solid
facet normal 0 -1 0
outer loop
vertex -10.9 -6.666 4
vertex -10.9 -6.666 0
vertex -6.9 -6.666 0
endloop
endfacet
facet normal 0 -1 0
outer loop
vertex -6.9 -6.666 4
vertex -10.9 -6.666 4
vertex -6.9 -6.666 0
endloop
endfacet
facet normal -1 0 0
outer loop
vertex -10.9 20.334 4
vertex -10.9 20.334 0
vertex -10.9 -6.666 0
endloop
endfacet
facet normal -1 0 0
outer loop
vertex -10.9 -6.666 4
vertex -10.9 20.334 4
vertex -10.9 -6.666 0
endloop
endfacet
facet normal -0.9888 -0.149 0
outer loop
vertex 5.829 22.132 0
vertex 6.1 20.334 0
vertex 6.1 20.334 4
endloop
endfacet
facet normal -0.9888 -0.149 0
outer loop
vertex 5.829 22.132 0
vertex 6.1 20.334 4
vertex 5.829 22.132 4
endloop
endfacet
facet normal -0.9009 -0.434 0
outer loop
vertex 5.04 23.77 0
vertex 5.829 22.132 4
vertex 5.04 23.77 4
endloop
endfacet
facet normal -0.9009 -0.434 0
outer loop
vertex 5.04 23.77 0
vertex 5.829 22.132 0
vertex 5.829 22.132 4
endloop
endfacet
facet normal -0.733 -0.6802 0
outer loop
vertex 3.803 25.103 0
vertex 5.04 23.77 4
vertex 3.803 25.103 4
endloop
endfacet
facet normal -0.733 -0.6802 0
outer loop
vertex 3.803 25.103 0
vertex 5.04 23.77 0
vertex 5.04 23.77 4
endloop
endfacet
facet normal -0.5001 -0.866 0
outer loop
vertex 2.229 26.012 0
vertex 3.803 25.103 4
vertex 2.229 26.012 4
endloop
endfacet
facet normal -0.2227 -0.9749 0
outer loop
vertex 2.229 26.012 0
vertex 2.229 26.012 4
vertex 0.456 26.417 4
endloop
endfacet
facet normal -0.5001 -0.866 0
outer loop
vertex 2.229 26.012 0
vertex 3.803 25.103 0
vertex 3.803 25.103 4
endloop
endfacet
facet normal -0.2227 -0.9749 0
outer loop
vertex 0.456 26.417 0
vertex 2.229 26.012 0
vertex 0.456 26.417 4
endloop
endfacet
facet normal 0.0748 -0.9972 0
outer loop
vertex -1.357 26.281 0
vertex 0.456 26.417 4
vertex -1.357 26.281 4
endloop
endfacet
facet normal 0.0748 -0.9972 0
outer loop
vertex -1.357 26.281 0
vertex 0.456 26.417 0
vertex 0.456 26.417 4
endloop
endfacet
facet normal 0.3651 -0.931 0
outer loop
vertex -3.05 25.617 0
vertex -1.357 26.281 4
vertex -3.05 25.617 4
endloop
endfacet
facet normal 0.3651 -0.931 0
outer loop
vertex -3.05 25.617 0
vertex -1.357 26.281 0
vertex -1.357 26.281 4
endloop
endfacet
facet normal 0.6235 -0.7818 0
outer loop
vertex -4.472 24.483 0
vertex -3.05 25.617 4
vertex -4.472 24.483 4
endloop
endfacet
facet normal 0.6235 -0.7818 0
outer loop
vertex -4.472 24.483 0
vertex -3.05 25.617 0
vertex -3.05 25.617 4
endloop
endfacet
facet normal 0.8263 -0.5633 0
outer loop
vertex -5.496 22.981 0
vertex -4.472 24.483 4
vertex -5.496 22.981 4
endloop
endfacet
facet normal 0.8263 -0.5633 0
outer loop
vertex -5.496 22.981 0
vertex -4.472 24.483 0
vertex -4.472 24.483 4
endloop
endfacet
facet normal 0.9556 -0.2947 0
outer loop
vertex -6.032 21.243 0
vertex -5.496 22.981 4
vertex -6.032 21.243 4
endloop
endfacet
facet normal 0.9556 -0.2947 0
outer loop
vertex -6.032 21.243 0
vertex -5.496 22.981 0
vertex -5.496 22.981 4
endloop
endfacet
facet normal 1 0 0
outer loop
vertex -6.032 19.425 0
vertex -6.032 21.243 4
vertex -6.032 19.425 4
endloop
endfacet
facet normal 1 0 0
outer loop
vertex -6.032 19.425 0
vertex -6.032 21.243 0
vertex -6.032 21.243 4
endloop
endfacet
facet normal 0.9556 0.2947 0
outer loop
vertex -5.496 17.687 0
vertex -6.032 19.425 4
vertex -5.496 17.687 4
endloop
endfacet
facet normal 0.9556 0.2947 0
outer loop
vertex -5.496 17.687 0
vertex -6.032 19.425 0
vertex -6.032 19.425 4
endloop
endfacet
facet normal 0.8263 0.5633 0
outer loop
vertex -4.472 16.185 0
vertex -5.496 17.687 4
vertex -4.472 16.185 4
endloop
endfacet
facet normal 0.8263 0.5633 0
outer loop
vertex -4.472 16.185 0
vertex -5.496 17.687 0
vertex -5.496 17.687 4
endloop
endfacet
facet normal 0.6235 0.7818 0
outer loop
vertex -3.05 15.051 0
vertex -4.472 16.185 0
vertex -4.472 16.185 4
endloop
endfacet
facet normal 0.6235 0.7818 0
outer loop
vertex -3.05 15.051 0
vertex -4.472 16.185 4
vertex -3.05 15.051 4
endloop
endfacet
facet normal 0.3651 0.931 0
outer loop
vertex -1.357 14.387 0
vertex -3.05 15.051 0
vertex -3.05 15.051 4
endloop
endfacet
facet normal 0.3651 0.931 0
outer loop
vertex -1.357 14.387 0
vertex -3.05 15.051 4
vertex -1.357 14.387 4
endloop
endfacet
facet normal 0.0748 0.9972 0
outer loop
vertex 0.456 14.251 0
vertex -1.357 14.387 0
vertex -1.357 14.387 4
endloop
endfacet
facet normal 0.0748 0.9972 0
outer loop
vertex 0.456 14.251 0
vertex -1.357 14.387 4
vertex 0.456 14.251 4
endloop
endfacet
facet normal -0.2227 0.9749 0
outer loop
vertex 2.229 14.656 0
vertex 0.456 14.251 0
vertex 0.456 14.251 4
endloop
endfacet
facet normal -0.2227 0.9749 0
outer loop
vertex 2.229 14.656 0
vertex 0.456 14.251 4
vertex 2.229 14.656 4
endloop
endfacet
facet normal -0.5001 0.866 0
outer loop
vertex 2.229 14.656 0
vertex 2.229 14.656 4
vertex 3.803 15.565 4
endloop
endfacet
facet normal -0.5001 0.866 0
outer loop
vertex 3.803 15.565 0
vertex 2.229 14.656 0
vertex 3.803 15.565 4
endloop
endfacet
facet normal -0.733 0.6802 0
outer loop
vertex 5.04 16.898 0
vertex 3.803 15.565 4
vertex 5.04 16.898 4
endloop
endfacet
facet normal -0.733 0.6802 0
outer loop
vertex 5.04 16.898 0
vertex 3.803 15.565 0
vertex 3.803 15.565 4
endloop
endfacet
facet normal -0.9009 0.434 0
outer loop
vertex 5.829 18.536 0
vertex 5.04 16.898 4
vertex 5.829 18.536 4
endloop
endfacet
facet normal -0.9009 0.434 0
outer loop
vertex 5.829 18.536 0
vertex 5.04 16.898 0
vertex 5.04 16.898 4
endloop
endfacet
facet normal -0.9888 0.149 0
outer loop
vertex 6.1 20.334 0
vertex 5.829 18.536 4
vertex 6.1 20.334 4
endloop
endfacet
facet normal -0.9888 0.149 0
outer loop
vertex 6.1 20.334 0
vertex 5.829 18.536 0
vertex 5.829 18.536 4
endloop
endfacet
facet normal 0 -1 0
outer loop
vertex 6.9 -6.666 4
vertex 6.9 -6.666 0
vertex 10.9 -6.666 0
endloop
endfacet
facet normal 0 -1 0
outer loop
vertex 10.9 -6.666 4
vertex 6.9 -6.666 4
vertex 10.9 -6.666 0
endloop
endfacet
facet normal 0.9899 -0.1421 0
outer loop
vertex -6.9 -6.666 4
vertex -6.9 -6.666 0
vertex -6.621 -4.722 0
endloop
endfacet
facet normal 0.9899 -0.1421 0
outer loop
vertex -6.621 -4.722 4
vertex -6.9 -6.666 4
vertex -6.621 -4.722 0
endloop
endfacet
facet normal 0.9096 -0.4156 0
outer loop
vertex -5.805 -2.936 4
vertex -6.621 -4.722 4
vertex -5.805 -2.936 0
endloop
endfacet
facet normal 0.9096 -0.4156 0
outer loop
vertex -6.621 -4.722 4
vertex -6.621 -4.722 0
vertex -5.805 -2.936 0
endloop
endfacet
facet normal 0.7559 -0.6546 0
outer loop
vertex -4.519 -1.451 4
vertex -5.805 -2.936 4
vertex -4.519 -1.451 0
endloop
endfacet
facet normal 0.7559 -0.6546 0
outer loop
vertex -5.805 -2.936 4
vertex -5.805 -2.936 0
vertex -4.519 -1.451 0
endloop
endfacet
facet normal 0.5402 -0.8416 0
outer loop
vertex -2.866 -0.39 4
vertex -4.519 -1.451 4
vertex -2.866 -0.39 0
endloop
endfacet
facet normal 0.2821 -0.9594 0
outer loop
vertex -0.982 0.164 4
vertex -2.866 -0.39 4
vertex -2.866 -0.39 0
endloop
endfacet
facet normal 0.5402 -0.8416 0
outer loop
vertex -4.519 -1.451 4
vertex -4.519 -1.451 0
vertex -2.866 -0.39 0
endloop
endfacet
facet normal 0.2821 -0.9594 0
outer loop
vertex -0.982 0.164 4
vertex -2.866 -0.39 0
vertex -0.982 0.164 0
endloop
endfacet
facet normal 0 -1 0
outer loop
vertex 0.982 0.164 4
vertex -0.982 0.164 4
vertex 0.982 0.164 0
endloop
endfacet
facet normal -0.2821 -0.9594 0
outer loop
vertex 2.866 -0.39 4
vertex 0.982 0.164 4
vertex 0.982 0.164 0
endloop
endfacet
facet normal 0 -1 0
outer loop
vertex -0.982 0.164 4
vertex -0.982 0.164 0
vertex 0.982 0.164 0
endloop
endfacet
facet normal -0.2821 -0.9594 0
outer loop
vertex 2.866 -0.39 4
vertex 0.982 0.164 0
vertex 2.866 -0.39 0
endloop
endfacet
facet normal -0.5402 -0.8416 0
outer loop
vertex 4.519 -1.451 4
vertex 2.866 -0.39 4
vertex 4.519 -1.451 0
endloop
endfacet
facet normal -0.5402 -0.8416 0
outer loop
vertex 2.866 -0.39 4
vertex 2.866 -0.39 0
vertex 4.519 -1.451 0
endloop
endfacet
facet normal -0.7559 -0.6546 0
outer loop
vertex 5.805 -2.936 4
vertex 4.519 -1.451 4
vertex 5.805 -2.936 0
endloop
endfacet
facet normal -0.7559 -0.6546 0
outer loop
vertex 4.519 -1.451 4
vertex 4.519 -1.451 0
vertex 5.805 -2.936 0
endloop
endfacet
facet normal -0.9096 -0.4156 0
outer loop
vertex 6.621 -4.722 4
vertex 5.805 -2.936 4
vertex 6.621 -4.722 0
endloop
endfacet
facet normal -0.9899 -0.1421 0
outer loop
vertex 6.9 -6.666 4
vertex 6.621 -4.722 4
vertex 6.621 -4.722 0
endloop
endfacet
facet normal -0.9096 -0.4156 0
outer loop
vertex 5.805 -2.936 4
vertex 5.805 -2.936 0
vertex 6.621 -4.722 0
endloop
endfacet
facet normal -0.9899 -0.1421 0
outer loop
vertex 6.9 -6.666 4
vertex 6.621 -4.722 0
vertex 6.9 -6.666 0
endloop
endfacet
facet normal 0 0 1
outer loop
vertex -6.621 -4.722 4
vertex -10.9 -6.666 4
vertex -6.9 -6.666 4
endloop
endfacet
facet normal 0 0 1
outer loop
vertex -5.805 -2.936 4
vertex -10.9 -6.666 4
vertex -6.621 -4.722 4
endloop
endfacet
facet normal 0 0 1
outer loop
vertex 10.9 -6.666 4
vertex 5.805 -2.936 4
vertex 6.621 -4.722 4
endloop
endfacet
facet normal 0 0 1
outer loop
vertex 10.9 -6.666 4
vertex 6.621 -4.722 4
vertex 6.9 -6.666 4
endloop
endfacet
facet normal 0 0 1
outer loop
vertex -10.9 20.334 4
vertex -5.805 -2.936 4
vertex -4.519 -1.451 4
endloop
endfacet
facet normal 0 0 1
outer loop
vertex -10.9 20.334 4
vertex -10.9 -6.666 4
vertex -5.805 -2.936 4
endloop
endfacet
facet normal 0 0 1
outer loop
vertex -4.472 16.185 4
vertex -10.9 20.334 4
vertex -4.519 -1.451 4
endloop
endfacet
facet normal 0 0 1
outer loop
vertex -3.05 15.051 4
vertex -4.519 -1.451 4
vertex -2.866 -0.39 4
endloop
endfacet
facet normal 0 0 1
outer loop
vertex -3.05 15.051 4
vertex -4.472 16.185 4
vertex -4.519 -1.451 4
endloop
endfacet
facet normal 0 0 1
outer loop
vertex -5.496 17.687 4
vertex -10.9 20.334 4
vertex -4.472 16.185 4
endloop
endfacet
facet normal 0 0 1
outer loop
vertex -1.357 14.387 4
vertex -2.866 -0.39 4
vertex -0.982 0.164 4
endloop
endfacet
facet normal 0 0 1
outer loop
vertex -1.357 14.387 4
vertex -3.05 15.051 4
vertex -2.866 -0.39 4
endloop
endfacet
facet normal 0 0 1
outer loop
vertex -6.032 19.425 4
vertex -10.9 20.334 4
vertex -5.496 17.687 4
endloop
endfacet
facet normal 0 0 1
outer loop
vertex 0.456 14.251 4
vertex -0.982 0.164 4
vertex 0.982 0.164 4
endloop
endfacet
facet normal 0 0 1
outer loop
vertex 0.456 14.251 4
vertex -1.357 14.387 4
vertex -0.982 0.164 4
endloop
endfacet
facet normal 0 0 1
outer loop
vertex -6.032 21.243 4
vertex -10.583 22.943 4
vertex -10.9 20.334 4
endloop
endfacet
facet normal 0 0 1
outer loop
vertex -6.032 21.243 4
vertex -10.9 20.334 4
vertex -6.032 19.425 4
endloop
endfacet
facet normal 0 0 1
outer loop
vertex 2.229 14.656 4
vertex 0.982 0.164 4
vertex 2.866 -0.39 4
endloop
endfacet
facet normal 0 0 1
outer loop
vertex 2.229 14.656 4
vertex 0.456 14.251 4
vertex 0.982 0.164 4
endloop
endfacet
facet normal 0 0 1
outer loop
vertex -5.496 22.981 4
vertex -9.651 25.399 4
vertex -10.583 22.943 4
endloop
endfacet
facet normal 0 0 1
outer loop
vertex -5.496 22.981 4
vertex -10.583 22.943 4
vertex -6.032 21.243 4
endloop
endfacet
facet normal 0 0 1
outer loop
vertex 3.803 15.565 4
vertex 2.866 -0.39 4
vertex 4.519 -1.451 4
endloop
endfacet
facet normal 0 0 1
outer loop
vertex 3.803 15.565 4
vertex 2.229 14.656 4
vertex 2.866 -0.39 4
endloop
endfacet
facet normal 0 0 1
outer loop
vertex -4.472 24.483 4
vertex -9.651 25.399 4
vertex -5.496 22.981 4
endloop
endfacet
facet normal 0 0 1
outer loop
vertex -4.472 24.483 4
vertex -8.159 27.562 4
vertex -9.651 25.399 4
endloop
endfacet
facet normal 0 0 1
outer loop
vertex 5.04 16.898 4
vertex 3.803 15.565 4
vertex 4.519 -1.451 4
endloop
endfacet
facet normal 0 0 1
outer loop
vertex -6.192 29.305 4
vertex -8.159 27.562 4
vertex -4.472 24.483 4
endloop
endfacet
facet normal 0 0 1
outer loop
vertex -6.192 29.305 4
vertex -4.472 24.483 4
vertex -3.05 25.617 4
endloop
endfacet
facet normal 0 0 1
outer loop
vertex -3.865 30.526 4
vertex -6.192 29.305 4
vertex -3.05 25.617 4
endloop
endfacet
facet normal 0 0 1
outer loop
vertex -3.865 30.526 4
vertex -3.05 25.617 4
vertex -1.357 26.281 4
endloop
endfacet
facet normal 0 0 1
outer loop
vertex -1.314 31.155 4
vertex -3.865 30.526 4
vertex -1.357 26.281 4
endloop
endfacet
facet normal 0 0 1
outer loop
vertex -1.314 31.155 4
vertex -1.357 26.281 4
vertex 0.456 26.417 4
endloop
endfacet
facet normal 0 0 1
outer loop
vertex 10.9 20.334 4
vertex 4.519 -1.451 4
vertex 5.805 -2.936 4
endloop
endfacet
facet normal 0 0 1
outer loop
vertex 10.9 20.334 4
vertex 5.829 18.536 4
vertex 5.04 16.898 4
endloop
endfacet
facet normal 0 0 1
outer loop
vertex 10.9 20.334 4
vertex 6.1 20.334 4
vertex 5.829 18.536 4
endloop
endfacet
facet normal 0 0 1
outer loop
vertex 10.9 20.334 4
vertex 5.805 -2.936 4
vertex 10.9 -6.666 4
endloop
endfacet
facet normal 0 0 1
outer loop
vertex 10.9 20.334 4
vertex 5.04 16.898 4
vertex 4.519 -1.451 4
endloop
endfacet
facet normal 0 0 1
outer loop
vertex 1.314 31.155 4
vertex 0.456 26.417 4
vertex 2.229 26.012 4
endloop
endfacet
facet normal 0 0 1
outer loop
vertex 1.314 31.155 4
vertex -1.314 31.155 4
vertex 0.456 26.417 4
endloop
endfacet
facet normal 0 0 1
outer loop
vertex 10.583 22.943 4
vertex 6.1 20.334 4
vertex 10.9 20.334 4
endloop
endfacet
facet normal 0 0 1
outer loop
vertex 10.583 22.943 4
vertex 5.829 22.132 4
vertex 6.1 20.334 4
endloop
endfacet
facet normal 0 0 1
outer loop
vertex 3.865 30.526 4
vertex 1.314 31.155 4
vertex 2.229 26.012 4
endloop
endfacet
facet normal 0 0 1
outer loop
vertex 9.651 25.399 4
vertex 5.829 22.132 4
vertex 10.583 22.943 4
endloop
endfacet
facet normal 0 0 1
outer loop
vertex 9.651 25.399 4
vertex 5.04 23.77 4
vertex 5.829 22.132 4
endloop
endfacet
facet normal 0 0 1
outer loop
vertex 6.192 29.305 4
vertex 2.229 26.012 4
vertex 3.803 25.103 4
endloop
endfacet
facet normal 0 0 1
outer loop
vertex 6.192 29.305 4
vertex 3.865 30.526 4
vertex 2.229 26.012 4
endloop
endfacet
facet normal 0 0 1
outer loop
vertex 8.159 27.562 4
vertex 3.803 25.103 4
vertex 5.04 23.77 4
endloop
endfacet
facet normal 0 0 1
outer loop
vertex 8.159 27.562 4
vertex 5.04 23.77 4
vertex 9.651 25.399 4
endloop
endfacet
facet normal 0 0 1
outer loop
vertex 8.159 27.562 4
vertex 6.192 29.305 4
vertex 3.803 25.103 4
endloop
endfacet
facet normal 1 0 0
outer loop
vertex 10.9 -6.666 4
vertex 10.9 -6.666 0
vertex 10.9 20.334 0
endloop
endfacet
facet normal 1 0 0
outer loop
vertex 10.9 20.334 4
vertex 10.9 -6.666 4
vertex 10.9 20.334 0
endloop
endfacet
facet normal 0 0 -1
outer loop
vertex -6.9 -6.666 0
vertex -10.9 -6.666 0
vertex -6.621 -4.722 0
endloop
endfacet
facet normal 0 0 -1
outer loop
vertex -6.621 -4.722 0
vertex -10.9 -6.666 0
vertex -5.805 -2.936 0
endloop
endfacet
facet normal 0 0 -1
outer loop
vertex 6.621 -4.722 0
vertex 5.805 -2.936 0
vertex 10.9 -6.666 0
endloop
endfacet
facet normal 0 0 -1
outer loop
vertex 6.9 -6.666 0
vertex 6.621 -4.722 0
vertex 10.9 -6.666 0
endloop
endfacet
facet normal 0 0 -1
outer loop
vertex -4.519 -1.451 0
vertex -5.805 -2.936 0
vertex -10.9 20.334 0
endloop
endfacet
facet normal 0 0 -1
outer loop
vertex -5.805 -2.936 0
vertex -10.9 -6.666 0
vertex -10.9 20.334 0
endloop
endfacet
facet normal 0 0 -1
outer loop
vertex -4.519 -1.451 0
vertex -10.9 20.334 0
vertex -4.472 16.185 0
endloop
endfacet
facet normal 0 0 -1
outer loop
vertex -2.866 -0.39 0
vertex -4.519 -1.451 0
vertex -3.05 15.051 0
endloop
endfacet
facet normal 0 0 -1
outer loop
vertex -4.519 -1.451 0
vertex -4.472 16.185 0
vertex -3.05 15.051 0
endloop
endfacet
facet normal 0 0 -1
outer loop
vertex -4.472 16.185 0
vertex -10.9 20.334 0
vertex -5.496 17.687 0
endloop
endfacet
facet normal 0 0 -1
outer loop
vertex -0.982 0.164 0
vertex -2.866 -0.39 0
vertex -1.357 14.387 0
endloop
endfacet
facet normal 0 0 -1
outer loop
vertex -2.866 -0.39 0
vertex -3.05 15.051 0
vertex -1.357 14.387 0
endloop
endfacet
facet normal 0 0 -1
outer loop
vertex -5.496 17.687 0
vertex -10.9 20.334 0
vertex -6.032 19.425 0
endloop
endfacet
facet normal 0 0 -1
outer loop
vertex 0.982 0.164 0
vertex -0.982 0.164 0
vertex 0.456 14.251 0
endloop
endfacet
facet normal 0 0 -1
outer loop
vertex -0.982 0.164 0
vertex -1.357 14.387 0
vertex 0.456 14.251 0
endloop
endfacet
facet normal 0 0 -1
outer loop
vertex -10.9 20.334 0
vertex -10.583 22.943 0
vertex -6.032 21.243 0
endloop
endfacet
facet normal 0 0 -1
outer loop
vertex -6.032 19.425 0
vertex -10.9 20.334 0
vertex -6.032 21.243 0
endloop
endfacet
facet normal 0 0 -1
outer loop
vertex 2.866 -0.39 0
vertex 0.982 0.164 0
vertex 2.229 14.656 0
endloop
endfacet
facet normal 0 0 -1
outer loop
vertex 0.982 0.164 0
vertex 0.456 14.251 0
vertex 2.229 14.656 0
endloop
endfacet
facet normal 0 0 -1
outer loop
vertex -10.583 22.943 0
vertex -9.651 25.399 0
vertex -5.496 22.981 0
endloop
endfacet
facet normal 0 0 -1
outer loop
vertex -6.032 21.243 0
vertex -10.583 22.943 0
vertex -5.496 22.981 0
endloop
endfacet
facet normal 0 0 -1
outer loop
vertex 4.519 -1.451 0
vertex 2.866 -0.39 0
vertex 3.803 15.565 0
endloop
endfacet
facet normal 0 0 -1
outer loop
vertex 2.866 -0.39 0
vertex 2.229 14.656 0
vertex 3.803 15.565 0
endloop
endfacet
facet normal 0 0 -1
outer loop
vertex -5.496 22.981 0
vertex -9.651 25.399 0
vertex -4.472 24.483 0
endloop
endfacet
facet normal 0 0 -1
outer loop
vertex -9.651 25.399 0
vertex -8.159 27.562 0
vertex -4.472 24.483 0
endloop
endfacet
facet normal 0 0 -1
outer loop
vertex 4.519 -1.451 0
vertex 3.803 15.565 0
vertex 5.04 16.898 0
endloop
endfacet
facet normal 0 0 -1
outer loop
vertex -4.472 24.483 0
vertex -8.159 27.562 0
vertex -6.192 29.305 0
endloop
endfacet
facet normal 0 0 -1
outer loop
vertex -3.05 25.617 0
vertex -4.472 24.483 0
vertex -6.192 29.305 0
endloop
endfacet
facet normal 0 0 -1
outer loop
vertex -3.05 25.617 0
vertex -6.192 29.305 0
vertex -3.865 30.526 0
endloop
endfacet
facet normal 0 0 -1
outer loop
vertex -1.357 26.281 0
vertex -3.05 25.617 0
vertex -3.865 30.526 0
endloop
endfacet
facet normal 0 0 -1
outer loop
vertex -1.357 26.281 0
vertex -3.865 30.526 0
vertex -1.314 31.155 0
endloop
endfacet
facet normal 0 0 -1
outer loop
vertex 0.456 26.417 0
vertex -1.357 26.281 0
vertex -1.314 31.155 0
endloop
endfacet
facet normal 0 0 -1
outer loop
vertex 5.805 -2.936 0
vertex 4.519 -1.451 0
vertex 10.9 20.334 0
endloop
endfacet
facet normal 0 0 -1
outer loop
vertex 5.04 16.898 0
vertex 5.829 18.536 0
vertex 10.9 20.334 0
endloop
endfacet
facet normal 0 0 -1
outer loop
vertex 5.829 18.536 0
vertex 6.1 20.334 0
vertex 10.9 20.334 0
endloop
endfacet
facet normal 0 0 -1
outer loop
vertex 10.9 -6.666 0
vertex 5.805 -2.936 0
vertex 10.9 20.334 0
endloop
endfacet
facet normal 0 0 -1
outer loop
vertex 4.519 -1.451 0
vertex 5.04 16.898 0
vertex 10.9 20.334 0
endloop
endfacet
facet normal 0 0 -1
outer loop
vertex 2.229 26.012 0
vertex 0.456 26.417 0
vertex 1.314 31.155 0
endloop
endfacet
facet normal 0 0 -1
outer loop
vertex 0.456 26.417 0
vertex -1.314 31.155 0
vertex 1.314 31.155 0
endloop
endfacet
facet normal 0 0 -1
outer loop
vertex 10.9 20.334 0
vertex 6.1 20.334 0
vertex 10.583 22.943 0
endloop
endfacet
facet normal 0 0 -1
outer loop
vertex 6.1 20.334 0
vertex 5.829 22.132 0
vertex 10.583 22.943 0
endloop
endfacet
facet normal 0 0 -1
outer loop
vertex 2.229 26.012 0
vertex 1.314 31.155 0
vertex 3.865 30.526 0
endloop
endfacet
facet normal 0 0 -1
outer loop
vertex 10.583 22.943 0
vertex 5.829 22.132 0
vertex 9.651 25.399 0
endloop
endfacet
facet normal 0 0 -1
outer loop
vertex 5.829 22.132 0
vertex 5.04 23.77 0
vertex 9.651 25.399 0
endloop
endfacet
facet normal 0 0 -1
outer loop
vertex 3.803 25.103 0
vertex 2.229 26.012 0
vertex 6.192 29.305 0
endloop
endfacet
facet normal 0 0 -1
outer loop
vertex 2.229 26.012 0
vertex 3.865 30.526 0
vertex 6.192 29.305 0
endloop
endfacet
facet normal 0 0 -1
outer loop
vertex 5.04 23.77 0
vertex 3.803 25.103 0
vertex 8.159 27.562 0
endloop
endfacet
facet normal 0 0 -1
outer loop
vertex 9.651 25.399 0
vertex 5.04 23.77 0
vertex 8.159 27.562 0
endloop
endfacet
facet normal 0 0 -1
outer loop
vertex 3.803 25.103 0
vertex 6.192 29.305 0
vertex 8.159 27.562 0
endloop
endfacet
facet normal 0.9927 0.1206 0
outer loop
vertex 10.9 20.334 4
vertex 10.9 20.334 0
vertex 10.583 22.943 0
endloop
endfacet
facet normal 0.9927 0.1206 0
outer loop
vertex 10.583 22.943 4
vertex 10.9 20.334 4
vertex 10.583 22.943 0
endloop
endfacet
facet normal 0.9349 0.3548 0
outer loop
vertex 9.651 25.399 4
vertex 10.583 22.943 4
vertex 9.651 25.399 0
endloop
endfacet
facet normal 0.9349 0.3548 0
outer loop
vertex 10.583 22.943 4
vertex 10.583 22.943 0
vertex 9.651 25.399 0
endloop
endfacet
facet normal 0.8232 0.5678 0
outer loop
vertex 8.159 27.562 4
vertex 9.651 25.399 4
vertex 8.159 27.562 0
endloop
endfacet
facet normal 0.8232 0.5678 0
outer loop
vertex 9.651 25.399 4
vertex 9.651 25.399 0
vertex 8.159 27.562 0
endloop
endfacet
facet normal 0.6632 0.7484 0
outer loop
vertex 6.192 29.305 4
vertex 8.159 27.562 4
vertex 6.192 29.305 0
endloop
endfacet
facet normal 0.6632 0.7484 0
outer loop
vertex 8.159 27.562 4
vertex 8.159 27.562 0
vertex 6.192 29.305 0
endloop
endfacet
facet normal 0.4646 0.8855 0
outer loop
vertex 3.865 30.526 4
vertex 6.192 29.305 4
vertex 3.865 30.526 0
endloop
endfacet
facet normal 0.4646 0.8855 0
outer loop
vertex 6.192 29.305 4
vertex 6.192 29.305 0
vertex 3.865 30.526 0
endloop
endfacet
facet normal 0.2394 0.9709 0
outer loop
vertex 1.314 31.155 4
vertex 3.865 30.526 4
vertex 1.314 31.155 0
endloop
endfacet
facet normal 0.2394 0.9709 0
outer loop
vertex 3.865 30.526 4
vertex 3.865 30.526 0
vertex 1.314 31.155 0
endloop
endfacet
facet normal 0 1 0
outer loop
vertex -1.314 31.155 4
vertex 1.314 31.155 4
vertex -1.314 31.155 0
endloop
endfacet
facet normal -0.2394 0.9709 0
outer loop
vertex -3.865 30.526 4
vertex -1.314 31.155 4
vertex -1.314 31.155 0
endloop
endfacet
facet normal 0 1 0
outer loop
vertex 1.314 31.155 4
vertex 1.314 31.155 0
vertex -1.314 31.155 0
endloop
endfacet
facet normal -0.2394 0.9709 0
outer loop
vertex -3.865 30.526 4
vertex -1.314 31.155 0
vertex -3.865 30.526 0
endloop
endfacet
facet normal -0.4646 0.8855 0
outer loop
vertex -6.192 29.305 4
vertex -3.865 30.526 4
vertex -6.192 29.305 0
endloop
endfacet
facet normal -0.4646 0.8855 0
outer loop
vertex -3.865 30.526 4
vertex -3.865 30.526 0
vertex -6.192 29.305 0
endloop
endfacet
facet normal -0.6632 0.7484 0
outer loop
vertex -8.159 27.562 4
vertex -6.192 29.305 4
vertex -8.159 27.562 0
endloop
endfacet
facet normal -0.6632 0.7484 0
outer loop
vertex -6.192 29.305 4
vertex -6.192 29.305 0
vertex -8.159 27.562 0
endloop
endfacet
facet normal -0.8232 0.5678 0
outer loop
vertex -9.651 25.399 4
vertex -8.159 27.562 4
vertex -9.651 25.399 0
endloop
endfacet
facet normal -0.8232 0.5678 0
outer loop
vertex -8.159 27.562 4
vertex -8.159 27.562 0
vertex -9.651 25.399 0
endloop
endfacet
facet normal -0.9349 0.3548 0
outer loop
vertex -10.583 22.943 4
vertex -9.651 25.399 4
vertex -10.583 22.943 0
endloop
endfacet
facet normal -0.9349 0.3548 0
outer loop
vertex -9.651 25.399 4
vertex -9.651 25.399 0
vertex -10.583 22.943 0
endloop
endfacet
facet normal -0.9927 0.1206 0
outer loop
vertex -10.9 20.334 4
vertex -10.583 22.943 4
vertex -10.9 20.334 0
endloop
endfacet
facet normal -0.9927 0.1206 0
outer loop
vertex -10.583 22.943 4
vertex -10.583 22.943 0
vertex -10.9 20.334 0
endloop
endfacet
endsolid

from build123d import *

# Parameters (mm, degrees)
SKETCH_1_R      = 6.1
EXTRUDE_1_DEPTH = 4


with BuildPart() as part:
    # 스케치1 → 보스-돌출1 (new body)
    with BuildSketch(Plane.XY):
        with BuildLine():
            Line((-10.9, 20.333989173), (-10.9, -6.666010827))
            Line((-10.9, -6.666010827), (-8.65, -6.666010827))
            Line((-8.65, -6.666010827), (-6.9, -6.666010827))
            ThreePointArc((-6.9, -6.666010827), (0, 0.233989173), (6.9, -6.666010827))
            Line((6.9, -6.666010827), (8.65, -6.666010827))
            Line((8.65, -6.666010827), (10.9, -6.666010827))
            Line((10.9, -6.666010827), (10.9, 20.333989173))
            ThreePointArc((10.9, 20.333989173), (0, 31.233989173), (-10.9, 20.333989173))
        make_face()
        with Locations((0, 20.333989173)):
            Circle(SKETCH_1_R, mode=Mode.SUBTRACT)
    extrude(amount=EXTRUDE_1_DEPTH)


solid = part.part
